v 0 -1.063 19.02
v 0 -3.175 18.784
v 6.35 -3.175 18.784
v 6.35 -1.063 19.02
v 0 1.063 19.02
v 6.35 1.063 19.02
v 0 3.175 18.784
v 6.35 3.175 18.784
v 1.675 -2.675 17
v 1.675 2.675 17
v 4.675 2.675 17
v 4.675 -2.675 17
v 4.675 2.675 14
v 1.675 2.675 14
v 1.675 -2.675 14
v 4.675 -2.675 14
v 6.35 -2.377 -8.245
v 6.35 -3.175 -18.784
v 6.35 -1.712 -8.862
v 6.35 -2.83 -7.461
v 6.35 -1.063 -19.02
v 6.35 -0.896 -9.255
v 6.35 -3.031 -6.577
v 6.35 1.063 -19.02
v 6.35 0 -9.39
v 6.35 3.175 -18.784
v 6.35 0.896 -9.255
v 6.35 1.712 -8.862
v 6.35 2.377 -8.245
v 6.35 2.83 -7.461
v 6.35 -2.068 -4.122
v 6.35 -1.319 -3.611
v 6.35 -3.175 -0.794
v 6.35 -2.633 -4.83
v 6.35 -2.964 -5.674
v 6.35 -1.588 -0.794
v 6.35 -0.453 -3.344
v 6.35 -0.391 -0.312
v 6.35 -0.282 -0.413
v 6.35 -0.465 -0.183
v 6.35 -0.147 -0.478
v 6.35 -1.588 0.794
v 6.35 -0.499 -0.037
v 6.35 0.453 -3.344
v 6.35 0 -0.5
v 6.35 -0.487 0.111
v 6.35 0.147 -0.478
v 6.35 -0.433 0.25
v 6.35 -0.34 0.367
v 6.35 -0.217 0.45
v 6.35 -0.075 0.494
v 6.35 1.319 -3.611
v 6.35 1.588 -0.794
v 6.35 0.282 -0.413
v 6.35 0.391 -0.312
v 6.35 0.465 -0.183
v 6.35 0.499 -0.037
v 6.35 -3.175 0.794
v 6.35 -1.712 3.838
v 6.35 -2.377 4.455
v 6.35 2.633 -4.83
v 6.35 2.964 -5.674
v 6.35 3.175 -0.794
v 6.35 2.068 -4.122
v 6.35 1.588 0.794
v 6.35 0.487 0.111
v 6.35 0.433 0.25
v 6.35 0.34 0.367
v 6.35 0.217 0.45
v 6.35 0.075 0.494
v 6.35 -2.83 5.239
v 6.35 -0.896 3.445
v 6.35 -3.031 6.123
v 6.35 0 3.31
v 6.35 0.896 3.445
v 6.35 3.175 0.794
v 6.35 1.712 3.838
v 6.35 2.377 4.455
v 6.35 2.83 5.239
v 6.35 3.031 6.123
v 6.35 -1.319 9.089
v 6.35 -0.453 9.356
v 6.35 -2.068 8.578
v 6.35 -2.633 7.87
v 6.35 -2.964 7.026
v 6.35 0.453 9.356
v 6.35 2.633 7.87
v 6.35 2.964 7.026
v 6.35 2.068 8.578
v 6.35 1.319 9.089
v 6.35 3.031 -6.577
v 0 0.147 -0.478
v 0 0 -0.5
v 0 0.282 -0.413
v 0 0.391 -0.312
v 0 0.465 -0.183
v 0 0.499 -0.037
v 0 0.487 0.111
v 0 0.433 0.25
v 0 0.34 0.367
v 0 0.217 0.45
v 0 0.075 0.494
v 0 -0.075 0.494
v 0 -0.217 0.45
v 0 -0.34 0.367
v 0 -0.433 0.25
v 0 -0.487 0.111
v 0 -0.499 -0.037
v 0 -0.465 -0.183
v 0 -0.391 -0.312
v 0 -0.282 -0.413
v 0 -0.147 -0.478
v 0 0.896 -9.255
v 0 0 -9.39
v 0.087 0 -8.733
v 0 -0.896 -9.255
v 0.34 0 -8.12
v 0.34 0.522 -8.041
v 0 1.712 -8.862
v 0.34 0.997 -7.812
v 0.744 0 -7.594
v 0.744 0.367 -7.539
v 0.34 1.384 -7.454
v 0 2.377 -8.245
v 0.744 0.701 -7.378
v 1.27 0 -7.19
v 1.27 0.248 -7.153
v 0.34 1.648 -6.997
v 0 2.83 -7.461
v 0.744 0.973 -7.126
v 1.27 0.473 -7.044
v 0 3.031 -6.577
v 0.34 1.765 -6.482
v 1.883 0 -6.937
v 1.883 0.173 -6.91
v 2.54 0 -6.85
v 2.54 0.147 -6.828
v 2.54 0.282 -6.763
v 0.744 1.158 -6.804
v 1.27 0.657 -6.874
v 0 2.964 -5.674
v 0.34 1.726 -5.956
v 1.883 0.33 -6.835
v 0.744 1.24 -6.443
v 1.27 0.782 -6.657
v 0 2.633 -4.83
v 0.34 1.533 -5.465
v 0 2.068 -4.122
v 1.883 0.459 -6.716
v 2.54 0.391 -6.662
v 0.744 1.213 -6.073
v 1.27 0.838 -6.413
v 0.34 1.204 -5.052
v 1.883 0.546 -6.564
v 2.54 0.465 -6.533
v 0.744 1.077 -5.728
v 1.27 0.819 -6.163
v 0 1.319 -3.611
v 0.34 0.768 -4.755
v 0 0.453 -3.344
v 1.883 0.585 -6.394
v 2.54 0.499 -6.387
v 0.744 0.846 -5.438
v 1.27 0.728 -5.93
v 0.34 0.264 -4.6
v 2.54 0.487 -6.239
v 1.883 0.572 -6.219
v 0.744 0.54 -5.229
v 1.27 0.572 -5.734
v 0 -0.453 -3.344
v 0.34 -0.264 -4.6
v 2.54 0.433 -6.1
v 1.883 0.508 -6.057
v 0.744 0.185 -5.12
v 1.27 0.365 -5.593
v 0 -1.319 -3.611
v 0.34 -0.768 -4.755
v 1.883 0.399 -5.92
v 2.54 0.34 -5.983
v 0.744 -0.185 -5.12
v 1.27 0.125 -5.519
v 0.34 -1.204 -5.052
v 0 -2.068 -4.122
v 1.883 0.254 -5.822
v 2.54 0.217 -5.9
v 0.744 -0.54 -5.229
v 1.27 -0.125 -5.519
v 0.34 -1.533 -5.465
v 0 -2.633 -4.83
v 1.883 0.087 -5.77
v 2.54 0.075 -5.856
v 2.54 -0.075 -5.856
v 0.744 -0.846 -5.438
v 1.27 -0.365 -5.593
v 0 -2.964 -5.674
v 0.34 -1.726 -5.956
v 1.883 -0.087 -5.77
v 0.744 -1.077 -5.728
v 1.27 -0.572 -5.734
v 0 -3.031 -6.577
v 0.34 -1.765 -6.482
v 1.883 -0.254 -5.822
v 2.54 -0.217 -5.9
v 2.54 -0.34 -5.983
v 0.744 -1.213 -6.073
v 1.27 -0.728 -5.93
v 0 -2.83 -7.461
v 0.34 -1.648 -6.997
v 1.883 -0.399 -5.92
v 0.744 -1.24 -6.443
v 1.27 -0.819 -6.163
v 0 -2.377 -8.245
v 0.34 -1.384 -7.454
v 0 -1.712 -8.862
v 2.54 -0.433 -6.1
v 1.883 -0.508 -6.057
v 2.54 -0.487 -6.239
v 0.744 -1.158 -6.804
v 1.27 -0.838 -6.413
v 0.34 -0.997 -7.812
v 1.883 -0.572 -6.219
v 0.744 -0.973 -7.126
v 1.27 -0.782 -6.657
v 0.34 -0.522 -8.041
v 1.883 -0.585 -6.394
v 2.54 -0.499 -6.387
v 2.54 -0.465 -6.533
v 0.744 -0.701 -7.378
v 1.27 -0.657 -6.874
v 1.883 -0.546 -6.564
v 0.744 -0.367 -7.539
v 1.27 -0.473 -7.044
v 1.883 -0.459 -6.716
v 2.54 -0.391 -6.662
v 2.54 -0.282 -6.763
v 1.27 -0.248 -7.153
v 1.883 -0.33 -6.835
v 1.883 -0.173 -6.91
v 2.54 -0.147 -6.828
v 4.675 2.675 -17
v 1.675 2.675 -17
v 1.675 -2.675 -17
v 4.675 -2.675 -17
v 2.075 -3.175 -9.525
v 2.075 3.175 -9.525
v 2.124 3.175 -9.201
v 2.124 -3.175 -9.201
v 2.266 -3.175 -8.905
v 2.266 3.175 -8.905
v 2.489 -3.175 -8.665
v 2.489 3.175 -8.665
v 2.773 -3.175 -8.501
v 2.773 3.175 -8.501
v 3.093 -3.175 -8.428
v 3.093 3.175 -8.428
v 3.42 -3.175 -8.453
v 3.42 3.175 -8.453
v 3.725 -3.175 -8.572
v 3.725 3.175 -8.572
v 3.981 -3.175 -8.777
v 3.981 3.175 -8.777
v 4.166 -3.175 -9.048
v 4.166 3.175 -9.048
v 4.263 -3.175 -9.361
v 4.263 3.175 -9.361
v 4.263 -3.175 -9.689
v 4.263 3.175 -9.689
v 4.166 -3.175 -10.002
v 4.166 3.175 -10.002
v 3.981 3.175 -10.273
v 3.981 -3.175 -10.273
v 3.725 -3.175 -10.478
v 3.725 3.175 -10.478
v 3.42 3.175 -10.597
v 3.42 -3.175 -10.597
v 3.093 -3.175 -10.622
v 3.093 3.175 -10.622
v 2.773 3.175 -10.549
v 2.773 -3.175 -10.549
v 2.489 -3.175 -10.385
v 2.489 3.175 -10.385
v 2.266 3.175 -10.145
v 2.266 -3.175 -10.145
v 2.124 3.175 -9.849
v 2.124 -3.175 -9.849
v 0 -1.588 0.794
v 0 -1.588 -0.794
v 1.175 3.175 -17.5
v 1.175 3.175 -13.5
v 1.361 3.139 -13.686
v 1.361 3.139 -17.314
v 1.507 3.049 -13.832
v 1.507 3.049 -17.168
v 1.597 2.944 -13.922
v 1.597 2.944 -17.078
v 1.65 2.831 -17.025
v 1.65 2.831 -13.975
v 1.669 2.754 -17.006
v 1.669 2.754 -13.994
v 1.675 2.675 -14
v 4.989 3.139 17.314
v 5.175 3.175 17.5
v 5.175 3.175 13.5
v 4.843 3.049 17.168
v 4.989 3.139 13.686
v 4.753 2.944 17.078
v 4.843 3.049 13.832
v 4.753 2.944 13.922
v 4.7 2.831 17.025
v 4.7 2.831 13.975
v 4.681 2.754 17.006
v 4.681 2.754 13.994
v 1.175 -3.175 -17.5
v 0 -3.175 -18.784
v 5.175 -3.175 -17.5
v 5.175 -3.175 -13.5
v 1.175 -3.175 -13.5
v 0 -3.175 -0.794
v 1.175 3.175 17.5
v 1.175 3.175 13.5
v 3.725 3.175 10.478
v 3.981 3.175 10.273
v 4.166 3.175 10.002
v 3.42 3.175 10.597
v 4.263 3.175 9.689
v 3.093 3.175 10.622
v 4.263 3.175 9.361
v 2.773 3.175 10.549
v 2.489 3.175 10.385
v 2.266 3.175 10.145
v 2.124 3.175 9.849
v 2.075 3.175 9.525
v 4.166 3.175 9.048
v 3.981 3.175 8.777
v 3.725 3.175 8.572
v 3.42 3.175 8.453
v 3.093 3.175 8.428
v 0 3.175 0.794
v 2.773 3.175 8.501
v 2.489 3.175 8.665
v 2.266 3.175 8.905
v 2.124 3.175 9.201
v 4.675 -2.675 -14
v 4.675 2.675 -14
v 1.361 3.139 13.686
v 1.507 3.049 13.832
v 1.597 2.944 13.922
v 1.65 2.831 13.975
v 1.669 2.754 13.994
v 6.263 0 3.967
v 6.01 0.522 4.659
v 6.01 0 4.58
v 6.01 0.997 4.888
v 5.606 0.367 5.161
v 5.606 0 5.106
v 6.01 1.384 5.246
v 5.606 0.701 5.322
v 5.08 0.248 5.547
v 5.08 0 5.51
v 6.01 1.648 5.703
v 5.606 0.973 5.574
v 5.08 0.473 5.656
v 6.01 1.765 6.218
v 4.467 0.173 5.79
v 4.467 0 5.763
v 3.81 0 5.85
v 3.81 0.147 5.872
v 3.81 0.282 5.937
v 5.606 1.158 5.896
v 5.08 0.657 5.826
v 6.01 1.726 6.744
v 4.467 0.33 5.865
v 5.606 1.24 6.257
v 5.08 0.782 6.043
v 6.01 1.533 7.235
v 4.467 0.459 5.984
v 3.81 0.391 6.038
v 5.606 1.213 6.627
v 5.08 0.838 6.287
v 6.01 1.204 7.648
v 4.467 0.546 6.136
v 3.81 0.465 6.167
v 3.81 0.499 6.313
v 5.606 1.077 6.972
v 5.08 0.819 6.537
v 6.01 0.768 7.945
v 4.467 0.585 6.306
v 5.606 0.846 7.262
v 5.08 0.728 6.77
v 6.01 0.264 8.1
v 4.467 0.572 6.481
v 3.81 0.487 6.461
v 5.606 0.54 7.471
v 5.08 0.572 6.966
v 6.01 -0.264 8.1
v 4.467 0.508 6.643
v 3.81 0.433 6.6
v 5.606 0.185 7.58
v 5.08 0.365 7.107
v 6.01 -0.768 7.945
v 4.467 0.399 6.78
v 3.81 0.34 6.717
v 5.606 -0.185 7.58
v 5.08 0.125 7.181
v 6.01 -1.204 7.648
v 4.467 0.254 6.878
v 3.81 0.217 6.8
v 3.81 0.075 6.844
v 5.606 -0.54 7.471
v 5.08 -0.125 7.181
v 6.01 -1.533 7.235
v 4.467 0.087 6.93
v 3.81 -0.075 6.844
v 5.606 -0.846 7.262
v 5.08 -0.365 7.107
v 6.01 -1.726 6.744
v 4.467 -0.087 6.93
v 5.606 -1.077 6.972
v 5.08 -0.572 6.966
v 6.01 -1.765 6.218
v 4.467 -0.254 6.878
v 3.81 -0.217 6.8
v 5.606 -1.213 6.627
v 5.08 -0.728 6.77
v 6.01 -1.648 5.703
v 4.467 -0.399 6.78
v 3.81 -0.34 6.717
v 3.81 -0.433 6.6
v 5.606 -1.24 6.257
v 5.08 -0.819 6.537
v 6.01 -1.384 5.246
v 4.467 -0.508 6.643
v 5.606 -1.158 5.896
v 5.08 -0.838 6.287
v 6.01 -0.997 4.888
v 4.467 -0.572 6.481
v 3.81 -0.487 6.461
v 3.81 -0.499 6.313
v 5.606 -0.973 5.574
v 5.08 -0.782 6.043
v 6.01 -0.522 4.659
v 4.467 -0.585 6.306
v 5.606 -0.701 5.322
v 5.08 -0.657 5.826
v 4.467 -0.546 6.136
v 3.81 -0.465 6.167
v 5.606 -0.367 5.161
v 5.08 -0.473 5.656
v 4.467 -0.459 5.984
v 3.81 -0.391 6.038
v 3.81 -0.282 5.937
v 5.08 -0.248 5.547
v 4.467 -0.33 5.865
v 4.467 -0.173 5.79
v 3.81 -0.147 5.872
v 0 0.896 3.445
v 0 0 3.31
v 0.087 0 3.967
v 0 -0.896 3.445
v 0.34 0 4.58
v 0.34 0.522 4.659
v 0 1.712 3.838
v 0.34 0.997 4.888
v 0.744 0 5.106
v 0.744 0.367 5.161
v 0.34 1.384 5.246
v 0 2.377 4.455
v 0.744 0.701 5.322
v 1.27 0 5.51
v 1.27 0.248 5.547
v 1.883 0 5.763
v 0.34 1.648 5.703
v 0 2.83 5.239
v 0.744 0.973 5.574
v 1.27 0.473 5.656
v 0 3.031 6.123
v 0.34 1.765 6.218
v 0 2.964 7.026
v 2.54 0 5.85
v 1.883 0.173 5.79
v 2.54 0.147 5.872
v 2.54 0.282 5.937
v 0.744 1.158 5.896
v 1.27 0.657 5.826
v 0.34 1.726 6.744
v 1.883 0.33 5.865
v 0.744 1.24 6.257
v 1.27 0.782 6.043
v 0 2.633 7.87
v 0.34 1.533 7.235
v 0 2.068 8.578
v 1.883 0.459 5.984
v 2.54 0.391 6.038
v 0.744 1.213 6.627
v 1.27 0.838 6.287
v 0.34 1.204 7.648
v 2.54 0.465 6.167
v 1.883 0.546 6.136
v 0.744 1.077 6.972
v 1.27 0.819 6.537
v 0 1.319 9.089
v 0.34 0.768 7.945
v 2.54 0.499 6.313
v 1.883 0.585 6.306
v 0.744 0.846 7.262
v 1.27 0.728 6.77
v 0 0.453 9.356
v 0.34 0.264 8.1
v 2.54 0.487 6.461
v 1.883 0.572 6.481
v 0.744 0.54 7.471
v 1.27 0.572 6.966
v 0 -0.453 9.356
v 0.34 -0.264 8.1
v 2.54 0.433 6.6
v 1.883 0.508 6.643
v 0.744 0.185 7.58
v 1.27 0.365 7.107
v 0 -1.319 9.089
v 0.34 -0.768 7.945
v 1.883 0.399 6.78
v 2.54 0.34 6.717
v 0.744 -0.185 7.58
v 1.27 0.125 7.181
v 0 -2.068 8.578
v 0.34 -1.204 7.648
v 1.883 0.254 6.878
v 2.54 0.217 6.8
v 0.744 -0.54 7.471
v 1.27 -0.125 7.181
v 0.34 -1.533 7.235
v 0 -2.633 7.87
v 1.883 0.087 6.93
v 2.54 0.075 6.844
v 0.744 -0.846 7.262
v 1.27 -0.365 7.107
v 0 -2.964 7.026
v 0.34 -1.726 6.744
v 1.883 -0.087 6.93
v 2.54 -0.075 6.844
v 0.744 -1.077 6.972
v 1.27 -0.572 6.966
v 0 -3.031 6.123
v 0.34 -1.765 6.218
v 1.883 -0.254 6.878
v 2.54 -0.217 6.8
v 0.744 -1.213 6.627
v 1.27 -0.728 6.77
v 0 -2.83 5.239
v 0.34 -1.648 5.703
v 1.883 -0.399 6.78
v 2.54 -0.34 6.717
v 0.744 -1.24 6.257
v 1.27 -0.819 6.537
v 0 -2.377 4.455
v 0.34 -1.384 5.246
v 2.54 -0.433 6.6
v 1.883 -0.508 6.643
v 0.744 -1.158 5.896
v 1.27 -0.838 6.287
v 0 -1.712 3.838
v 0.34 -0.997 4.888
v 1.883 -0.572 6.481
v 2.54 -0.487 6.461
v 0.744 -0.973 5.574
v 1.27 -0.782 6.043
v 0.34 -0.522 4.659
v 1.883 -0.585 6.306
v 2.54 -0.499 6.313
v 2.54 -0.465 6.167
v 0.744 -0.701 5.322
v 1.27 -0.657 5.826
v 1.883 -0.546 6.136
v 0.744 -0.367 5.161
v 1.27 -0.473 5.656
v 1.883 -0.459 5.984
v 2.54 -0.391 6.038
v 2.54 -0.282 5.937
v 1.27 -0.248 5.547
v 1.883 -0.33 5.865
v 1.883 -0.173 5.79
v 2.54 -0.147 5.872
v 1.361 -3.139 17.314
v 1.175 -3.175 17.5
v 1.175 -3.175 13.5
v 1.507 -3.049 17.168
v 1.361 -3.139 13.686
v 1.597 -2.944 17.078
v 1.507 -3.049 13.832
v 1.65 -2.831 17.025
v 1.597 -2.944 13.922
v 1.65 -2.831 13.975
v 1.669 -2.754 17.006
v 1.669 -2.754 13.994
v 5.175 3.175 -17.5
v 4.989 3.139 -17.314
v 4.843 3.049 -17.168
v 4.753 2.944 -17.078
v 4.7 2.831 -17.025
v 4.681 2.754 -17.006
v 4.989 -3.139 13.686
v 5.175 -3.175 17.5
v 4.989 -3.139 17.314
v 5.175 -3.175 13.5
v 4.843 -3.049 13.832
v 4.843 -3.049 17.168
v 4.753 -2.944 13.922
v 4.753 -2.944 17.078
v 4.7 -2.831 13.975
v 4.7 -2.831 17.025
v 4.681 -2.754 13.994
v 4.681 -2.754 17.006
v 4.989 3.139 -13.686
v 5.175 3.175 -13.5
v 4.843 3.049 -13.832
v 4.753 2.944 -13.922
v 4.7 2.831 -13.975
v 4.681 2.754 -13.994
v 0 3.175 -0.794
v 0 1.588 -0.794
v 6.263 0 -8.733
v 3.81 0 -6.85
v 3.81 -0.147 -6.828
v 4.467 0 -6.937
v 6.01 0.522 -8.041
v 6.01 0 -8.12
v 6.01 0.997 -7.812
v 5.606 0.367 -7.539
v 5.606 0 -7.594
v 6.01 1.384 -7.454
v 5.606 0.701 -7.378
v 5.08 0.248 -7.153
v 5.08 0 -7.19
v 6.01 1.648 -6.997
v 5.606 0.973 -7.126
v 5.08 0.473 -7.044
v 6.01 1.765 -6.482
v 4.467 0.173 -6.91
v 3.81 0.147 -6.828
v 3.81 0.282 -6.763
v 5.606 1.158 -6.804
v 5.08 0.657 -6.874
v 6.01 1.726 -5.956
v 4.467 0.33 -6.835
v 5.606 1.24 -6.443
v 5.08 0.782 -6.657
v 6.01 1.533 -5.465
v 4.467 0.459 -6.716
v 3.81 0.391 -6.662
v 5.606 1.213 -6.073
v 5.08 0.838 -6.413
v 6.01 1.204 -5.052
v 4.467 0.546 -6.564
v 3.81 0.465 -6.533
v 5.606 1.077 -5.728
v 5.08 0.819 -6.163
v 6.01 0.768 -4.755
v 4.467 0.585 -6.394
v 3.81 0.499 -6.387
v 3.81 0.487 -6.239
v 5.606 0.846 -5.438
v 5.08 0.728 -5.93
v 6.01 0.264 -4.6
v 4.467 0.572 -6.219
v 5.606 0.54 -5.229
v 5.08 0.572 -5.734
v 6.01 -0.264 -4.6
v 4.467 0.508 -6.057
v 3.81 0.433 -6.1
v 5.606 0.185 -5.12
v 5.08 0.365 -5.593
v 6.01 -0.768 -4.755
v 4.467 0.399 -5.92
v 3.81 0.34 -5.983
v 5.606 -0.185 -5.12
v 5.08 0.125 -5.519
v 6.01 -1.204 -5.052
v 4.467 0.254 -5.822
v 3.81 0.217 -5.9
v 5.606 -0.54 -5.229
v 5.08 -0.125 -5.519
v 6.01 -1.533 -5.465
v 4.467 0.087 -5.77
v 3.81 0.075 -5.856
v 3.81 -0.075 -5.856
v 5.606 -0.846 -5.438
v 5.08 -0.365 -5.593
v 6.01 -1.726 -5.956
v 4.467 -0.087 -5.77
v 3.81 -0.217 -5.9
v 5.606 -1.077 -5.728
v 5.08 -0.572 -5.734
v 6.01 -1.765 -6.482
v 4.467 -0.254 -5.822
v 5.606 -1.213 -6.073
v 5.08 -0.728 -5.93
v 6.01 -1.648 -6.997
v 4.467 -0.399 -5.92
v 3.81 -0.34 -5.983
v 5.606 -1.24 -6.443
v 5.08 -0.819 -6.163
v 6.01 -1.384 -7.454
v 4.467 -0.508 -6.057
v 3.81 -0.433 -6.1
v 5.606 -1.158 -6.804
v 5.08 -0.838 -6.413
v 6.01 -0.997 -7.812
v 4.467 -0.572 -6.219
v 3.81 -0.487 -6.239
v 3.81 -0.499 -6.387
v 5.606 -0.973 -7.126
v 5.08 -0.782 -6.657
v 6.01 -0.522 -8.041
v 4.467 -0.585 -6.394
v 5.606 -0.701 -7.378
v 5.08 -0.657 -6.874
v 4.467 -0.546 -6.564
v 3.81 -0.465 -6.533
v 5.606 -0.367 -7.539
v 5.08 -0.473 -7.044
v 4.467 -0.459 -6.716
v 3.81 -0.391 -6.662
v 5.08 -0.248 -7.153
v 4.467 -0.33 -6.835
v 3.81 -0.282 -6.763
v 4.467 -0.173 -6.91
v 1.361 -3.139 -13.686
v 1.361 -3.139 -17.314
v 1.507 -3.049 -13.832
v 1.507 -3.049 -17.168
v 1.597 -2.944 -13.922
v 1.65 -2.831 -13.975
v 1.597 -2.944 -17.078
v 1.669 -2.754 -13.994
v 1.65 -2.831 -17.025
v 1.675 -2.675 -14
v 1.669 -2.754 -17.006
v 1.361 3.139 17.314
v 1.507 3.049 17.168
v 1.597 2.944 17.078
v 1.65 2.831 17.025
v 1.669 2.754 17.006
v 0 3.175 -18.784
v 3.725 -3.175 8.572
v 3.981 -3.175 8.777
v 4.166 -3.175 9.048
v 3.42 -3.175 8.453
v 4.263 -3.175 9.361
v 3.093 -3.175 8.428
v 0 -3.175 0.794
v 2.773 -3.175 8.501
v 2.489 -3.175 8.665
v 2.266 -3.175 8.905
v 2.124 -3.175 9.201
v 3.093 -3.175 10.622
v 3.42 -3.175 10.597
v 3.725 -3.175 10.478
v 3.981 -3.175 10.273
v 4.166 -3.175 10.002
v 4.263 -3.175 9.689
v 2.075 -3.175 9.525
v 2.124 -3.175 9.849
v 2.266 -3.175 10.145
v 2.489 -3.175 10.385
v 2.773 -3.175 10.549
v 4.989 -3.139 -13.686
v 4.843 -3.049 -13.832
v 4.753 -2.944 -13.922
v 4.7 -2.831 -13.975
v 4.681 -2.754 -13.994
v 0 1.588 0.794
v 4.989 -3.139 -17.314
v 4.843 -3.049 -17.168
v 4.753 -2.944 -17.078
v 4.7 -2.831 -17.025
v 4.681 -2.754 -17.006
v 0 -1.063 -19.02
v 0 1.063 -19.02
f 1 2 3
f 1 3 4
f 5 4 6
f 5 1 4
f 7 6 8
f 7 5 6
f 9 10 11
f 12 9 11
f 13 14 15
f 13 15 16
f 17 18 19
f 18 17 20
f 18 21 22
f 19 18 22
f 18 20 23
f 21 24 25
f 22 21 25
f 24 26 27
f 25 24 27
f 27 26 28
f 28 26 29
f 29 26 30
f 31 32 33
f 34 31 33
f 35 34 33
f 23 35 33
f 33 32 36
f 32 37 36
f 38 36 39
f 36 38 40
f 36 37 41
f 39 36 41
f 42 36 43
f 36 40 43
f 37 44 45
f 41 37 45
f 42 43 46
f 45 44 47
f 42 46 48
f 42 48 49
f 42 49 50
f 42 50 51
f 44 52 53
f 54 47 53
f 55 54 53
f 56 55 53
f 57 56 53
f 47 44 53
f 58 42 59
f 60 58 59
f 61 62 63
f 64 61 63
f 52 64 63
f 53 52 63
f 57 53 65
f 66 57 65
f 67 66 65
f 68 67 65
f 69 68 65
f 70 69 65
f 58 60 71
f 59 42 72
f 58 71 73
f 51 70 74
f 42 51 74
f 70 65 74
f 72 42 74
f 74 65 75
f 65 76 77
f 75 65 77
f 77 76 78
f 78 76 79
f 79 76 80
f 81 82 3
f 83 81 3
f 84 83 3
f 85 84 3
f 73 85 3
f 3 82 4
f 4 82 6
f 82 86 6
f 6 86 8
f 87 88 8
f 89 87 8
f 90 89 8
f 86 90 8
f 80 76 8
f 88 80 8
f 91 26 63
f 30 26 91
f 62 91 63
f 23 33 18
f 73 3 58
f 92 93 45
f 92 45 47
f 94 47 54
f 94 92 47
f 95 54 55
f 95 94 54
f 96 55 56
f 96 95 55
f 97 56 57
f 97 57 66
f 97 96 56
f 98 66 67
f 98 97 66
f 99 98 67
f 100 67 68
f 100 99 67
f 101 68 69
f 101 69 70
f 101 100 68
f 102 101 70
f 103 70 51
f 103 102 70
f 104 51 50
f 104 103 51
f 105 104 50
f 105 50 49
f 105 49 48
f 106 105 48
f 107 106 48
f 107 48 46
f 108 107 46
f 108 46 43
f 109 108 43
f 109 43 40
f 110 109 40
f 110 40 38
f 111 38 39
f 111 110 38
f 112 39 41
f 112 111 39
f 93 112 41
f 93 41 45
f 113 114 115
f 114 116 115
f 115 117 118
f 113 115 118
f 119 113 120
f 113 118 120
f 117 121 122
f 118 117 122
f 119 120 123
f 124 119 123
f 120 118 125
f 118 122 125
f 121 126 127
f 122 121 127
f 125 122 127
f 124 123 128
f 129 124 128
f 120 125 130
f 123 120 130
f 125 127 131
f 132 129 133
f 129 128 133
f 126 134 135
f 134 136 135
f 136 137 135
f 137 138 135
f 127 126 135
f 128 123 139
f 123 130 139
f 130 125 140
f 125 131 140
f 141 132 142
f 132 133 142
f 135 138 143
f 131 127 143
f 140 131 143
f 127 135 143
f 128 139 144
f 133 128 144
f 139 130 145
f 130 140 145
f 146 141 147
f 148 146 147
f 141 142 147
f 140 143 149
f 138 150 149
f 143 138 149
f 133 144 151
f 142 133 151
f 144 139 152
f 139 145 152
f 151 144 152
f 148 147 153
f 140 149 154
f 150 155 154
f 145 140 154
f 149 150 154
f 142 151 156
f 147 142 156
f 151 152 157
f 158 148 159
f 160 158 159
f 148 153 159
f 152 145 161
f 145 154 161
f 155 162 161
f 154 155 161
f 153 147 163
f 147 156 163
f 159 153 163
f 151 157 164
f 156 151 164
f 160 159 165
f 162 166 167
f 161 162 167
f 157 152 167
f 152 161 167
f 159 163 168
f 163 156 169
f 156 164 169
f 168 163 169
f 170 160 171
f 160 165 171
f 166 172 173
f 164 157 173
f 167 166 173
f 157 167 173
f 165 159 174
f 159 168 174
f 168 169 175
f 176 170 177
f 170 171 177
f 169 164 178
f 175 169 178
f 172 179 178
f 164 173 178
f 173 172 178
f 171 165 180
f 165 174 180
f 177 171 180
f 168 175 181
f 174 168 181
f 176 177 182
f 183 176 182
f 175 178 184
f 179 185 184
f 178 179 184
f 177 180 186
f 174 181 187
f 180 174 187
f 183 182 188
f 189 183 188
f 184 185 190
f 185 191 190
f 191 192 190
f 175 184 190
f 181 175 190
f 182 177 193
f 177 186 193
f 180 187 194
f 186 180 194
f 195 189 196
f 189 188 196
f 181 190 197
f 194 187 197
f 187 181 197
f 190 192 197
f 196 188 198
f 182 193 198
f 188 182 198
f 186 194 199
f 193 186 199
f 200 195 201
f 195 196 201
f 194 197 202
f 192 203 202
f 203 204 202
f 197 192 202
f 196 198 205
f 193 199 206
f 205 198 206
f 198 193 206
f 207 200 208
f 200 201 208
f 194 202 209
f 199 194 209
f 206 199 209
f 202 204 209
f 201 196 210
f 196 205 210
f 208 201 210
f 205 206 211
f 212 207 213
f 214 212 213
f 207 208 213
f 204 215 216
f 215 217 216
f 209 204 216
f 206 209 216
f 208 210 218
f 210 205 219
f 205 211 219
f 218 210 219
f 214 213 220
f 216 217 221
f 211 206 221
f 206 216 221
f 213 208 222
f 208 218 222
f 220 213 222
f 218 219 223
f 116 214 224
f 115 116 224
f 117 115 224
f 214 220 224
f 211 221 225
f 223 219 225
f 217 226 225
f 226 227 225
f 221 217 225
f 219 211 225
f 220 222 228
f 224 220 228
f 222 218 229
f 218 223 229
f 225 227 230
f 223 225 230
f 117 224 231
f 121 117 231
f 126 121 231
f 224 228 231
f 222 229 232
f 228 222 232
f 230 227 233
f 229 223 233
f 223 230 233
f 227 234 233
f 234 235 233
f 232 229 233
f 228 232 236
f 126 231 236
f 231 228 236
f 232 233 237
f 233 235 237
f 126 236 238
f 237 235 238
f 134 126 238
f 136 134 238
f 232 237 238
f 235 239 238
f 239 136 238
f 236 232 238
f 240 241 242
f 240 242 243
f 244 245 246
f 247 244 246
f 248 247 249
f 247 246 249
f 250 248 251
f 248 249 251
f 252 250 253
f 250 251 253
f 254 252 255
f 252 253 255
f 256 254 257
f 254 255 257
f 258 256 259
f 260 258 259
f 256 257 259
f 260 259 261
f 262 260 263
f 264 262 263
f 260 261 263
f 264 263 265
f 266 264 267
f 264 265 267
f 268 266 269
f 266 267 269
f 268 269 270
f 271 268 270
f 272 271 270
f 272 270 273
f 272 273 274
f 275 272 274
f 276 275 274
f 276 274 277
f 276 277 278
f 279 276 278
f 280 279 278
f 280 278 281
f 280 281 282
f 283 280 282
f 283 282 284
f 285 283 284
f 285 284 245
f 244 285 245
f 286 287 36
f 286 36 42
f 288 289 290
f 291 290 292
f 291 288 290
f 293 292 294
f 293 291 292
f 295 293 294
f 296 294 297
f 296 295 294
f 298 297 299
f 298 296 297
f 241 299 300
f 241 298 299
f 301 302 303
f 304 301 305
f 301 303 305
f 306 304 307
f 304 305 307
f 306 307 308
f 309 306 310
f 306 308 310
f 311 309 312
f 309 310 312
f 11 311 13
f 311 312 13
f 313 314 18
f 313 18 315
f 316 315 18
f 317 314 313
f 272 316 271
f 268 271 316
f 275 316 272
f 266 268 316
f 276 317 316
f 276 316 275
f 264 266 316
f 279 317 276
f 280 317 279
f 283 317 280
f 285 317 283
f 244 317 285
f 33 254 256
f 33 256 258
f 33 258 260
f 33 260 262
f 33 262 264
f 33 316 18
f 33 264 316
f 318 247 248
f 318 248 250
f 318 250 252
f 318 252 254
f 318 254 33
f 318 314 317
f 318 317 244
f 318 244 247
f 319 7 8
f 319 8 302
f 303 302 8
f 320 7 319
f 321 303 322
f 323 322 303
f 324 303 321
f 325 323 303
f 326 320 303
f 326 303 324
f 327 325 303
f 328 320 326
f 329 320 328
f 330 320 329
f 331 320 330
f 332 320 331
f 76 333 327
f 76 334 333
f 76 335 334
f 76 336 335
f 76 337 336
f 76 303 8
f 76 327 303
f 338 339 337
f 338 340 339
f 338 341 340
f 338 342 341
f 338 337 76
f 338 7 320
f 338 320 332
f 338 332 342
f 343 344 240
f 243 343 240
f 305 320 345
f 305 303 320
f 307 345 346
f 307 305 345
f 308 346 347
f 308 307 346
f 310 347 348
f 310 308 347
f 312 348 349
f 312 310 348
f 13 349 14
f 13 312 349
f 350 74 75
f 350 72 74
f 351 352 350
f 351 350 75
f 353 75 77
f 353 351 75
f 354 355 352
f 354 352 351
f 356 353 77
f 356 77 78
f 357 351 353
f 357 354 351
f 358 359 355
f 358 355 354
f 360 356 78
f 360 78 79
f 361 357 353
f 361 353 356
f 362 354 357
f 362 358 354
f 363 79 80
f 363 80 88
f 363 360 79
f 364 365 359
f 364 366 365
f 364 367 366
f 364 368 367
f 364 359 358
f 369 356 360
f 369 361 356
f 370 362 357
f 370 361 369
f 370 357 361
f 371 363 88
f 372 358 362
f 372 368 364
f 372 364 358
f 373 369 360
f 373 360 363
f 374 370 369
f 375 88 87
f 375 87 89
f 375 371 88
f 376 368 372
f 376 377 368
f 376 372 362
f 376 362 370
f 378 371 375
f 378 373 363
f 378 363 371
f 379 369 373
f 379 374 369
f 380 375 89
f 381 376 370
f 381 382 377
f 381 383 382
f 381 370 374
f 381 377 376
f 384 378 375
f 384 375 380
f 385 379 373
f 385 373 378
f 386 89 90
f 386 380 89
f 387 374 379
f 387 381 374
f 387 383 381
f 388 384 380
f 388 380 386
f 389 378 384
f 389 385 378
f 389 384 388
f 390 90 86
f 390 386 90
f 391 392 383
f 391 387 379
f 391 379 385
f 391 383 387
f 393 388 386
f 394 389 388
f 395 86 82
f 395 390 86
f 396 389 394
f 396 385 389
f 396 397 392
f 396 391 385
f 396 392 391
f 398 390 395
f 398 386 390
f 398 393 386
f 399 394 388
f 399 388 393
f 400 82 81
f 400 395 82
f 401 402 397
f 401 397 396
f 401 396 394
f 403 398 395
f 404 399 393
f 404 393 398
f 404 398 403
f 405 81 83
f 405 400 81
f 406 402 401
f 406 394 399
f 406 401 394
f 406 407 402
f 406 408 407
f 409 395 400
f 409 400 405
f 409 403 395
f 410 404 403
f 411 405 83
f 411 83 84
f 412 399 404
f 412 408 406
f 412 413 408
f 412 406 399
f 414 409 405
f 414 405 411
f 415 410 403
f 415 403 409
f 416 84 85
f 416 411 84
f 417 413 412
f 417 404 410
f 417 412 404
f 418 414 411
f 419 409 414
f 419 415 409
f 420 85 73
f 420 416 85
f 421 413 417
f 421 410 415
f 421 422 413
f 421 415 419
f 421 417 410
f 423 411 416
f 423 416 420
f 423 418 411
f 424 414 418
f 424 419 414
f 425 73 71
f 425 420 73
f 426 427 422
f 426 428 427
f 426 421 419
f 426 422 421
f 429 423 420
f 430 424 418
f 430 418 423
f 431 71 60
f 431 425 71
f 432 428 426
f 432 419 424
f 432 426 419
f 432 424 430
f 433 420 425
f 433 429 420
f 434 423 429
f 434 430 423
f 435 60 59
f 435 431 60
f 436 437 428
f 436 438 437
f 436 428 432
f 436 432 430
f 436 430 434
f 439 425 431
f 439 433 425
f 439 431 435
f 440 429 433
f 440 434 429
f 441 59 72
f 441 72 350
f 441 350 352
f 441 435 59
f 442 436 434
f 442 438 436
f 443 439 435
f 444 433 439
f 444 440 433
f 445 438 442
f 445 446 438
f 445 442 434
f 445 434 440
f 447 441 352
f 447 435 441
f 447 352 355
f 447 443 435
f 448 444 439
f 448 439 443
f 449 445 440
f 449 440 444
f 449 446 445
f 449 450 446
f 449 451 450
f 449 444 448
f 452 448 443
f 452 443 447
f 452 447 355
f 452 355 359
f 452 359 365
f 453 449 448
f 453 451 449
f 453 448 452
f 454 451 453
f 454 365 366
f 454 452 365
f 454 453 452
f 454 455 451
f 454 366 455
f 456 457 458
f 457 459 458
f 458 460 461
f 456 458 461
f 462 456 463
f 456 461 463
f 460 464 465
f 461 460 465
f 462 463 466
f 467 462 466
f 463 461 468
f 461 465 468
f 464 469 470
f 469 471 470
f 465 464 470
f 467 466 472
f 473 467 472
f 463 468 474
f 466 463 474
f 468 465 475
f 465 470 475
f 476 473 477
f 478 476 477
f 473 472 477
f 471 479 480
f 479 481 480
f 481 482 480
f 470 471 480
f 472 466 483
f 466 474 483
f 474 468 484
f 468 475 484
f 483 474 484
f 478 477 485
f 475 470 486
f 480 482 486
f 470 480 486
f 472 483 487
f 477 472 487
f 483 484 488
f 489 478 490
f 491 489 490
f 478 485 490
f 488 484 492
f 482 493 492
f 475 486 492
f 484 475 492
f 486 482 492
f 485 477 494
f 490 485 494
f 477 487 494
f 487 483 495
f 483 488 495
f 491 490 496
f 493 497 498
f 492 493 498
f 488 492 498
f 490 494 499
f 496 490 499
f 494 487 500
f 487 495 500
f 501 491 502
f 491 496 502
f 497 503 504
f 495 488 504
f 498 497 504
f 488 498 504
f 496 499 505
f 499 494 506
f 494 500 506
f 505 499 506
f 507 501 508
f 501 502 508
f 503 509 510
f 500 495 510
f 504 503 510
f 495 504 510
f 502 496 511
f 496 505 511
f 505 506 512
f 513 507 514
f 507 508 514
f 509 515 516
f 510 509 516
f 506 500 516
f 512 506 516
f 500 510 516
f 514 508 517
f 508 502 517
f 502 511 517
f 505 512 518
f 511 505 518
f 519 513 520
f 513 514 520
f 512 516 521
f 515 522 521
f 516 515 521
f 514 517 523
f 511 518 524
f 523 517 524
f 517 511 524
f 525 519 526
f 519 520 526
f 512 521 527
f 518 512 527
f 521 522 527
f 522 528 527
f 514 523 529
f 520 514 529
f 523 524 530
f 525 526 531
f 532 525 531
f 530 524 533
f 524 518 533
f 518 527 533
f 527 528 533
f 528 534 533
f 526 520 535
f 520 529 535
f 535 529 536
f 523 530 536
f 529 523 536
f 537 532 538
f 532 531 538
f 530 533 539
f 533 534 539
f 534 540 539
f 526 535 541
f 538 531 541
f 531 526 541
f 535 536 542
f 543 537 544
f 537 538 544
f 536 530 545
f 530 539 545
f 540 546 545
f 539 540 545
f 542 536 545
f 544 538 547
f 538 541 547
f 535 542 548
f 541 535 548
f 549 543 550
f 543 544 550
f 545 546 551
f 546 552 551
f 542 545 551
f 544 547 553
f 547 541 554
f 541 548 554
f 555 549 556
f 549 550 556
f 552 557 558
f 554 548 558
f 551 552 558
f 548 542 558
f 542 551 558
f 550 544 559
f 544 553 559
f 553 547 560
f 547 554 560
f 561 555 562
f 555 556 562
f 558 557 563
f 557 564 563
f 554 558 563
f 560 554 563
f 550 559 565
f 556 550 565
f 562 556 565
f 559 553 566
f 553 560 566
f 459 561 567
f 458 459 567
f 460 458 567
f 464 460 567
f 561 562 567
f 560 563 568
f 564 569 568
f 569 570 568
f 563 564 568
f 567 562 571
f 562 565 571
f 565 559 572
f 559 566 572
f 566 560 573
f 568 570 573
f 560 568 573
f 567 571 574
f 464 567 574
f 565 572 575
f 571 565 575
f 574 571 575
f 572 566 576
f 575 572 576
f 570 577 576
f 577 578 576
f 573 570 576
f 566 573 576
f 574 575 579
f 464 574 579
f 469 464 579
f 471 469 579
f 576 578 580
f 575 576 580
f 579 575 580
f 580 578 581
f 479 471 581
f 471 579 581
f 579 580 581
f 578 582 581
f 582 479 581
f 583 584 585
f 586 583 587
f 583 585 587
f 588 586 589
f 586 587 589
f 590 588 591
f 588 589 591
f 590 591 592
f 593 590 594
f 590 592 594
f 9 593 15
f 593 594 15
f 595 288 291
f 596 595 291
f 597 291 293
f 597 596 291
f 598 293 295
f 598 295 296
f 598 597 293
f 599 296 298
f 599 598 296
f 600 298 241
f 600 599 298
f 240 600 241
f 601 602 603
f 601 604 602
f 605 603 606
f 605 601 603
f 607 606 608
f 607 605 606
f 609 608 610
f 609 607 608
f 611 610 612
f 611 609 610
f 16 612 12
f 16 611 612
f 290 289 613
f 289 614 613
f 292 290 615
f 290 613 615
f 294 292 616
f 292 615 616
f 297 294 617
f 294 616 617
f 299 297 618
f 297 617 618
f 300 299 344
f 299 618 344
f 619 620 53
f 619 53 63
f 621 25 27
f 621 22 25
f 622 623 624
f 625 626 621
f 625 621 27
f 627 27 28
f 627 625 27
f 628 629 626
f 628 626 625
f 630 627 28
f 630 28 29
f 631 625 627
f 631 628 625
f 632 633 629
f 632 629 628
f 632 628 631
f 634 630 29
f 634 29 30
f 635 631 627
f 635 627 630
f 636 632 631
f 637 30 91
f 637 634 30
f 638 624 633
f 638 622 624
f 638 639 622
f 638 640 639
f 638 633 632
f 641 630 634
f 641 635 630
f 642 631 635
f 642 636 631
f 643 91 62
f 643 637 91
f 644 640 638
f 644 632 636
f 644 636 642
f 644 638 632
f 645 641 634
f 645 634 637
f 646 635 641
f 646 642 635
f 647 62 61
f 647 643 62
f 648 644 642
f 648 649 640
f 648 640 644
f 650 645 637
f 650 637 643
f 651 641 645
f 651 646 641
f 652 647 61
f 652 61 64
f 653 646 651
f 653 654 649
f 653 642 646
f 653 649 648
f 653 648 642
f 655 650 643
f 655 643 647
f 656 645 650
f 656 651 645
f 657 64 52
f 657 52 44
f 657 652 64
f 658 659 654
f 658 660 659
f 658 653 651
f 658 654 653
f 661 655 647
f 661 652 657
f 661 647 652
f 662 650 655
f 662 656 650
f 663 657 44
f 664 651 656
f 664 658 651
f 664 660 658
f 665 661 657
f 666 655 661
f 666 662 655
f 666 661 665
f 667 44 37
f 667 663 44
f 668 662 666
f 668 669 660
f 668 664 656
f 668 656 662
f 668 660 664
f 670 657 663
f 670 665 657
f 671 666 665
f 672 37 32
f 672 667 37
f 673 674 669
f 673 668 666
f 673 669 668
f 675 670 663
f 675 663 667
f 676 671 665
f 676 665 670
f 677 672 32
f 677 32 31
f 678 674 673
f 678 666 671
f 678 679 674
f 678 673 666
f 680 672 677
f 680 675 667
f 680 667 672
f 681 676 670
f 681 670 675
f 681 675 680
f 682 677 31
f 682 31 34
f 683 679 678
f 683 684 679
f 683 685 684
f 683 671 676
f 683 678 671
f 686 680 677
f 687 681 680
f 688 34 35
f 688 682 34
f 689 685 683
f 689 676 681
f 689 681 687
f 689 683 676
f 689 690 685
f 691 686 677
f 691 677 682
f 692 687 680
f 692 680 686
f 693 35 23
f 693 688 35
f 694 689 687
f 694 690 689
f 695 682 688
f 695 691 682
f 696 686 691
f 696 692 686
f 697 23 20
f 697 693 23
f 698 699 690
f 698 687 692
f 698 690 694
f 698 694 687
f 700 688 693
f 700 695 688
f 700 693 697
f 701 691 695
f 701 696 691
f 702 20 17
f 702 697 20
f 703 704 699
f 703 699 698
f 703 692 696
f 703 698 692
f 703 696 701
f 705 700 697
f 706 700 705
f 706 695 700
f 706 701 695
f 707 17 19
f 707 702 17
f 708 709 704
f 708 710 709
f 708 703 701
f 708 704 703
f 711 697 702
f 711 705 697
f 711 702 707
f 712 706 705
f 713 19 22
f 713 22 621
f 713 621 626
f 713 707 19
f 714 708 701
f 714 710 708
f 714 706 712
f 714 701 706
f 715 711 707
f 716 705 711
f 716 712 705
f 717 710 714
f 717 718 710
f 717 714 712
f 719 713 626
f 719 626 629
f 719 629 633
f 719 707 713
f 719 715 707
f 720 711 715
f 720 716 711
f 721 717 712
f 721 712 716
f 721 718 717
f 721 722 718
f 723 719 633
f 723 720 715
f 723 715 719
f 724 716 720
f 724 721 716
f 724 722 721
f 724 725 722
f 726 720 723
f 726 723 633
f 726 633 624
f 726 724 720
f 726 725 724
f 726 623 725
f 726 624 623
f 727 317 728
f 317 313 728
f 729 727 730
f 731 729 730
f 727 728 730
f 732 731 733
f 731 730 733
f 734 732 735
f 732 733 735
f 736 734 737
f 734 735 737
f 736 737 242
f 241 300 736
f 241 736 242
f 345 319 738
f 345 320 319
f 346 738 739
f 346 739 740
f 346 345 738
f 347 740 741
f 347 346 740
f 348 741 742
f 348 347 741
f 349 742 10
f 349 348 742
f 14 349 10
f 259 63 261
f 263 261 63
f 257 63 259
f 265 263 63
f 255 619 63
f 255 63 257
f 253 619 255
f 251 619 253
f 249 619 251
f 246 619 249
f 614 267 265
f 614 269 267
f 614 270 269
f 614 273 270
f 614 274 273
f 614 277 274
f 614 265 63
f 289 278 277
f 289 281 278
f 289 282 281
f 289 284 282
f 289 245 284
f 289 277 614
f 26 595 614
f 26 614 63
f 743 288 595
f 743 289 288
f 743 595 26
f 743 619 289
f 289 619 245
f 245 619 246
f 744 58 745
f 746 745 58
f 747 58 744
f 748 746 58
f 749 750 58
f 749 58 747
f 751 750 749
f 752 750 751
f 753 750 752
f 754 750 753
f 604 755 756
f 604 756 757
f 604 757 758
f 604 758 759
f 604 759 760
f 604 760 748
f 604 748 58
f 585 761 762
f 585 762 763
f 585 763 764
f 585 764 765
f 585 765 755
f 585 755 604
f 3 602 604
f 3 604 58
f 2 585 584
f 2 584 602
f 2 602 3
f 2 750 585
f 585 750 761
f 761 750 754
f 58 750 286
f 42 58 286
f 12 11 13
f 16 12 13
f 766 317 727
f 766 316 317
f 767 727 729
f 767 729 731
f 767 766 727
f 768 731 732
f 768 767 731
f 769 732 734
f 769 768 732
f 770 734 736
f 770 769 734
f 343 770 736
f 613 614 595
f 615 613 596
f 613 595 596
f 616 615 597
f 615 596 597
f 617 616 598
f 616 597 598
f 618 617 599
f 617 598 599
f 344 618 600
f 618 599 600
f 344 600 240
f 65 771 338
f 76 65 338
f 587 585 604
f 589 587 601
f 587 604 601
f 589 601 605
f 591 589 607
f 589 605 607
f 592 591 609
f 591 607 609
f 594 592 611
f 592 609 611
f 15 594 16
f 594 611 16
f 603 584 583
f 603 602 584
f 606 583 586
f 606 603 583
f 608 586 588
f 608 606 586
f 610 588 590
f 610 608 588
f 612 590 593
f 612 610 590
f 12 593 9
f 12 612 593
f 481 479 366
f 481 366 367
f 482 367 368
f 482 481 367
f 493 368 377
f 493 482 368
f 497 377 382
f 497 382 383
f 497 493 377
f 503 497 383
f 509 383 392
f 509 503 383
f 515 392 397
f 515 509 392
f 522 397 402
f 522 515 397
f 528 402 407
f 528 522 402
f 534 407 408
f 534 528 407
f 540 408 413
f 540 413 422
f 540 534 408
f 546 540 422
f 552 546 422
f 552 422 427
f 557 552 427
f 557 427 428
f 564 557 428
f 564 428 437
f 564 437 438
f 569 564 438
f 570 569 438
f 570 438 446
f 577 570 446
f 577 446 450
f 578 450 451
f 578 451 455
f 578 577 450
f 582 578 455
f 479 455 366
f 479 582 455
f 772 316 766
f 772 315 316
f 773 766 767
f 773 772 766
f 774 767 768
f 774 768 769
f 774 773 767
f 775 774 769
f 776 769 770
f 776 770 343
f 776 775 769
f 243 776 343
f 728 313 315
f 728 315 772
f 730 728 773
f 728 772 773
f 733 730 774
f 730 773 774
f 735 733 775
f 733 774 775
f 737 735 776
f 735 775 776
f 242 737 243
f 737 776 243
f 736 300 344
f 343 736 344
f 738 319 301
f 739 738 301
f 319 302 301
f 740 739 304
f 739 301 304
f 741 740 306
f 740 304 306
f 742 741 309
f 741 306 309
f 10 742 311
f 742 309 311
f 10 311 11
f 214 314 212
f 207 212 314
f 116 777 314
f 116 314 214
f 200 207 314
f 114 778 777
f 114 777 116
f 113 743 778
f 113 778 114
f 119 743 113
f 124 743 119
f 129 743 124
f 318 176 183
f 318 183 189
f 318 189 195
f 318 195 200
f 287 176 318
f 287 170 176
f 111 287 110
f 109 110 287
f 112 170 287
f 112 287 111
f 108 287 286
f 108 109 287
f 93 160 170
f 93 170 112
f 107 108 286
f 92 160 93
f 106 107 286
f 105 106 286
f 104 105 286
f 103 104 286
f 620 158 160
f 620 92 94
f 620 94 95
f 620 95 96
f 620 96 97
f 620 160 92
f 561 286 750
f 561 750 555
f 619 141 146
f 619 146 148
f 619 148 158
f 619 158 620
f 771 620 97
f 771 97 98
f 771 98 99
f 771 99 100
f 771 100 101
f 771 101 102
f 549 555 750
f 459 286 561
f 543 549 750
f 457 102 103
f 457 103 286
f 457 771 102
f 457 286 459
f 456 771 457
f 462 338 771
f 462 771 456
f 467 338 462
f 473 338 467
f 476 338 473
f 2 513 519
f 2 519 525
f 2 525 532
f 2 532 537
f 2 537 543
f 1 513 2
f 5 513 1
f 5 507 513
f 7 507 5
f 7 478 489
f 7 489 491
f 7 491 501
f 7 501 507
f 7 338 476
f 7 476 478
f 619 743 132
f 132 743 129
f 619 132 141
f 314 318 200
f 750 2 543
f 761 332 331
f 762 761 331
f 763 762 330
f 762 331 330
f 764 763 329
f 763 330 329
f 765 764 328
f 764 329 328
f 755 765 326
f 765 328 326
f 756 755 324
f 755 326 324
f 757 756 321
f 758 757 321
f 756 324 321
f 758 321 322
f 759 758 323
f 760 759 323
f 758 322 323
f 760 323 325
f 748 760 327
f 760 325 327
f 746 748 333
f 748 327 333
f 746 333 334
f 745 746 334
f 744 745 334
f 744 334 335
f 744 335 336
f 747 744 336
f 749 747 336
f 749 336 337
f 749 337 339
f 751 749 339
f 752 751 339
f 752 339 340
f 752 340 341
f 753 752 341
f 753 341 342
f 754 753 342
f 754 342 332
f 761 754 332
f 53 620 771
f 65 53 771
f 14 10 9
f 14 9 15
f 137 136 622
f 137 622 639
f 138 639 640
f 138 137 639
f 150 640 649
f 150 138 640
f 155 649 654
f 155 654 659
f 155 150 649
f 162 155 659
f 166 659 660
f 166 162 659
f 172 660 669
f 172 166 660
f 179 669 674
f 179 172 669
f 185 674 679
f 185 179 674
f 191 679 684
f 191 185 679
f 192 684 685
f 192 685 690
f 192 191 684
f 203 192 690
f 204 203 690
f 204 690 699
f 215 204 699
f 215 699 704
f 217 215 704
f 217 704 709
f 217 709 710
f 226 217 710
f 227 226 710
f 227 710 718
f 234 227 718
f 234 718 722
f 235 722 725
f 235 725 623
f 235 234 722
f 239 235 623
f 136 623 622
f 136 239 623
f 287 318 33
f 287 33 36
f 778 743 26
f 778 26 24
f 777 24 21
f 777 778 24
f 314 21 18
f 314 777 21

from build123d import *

# Parameters (mm, degrees)
SKETCH1_R                = 0.5
BOSS_EXTRUDE1_DEPTH      = 6.35
SKETCH2_W                = 3
SKETCH2_H                = 3
CUT_EXTRUDE1_DEPTH       = 6.35
FILLET1_R                = 2.54
M2_CLEARANCE_HOLE1_D     = 2.2
M2_CLEARANCE_HOLE1_DEPTH = 28.34894
M2_CLEARANCE_HOLE1_TIP   = 0.660946681
FILLET2_R                = 0.5
SKETCH6_W                = 1.5875
SKETCH6_H                = 1.5875
CUT_EXTRUDE2_DEPTH       = 21.329919454


with BuildPart() as part:
    # Sketch1 → Boss-Extrude1 (new body)
    with BuildSketch(Plane(origin=(0, 0, 0), x_dir=(0, 0, -1), z_dir=(1, 0, 0))):
        with BuildLine():
            Line((-18.783553311, 3.175), (18.783553311, 3.175))
            ThreePointArc((18.783553311, 3.175), (19.05, 0), (18.783553311, -3.175))
            Line((18.783553311, -3.175), (-18.783553311, -3.175))
            ThreePointArc((-18.783553311, -3.175), (-19.05, 0), (-18.783553311, 3.175))
        make_face()
        with Locations((6.35, 0)):
            Circle(SKETCH1_R, mode=Mode.SUBTRACT)
        with Locations((-6.35, 0)):
            Circle(SKETCH1_R, mode=Mode.SUBTRACT)
        Circle(SKETCH1_R, mode=Mode.SUBTRACT)
    extrude(amount=BOSS_EXTRUDE1_DEPTH)

    # Sketch2 → Cut-Extrude1 (cut)
    with BuildSketch(Plane(origin=(0, 3.175, 0), x_dir=(1, 0, 0), z_dir=(0, 1, 0))):
        with Locations((3.175, -15.5)):
            Rectangle(SKETCH2_W, SKETCH2_H)
        with Locations((3.175, 15.5)):
            Rectangle(SKETCH2_W, SKETCH2_H)
    extrude(amount=-CUT_EXTRUDE1_DEPTH, mode=Mode.SUBTRACT)

    # Fillet1
    fillet1_edges = [part.edges().sort_by_distance(p)[0] for p in [
        (0, 0, -5.85),
        (6.35, 0, -5.85),
        (0, 0, 6.85),
        (6.35, 0, 6.85),
    ]]
    fillet(fillet1_edges, radius=FILLET1_R)

    # M2 Clearance Hole1
    with Locations(Plane.XZ.offset(3.175)):
        with Locations((3.175, 9.525), (3.175, -9.525)):
            Hole(M2_CLEARANCE_HOLE1_D / 2, depth=M2_CLEARANCE_HOLE1_DEPTH)
            with Locations((0, 0, -(M2_CLEARANCE_HOLE1_DEPTH + M2_CLEARANCE_HOLE1_TIP / 2))):  # 118° drill point
                Cone(0, M2_CLEARANCE_HOLE1_D / 2, M2_CLEARANCE_HOLE1_TIP, mode=Mode.SUBTRACT)

    # Fillet2
    fillet2_edges = [part.edges().sort_by_distance(p)[0] for p in [
        (1.675, -3.175, 15.5),
        (3.175, -3.175, 14),
        (4.675, -3.175, 15.5),
        (3.175, -3.175, 17),
        (1.675, 3.175, 15.5),
        (3.175, 3.175, 17),
        (4.675, 3.175, 15.5),
        (3.175, 3.175, 14),
        (3.175, -3.175, -17),
        (4.675, -3.175, -15.5),
        (3.175, -3.175, -14),
        (1.675, -3.175, -15.5),
        (3.175, 3.175, -17),
        (1.675, 3.175, -15.5),
        (3.175, 3.175, -14),
        (4.675, 3.175, -15.5),
    ]]
    fillet(fillet2_edges, radius=FILLET2_R)

    # Sketch6 → Cut-Extrude2 (cut, through all)
    with BuildSketch(Plane.ZY):
        with Locations((0, -2.38125)):
            Rectangle(SKETCH6_W, SKETCH6_H)
        with Locations((0, 2.38125)):
            Rectangle(SKETCH6_W, SKETCH6_H)
    extrude(amount=-CUT_EXTRUDE2_DEPTH, mode=Mode.SUBTRACT)


solid = part.part
